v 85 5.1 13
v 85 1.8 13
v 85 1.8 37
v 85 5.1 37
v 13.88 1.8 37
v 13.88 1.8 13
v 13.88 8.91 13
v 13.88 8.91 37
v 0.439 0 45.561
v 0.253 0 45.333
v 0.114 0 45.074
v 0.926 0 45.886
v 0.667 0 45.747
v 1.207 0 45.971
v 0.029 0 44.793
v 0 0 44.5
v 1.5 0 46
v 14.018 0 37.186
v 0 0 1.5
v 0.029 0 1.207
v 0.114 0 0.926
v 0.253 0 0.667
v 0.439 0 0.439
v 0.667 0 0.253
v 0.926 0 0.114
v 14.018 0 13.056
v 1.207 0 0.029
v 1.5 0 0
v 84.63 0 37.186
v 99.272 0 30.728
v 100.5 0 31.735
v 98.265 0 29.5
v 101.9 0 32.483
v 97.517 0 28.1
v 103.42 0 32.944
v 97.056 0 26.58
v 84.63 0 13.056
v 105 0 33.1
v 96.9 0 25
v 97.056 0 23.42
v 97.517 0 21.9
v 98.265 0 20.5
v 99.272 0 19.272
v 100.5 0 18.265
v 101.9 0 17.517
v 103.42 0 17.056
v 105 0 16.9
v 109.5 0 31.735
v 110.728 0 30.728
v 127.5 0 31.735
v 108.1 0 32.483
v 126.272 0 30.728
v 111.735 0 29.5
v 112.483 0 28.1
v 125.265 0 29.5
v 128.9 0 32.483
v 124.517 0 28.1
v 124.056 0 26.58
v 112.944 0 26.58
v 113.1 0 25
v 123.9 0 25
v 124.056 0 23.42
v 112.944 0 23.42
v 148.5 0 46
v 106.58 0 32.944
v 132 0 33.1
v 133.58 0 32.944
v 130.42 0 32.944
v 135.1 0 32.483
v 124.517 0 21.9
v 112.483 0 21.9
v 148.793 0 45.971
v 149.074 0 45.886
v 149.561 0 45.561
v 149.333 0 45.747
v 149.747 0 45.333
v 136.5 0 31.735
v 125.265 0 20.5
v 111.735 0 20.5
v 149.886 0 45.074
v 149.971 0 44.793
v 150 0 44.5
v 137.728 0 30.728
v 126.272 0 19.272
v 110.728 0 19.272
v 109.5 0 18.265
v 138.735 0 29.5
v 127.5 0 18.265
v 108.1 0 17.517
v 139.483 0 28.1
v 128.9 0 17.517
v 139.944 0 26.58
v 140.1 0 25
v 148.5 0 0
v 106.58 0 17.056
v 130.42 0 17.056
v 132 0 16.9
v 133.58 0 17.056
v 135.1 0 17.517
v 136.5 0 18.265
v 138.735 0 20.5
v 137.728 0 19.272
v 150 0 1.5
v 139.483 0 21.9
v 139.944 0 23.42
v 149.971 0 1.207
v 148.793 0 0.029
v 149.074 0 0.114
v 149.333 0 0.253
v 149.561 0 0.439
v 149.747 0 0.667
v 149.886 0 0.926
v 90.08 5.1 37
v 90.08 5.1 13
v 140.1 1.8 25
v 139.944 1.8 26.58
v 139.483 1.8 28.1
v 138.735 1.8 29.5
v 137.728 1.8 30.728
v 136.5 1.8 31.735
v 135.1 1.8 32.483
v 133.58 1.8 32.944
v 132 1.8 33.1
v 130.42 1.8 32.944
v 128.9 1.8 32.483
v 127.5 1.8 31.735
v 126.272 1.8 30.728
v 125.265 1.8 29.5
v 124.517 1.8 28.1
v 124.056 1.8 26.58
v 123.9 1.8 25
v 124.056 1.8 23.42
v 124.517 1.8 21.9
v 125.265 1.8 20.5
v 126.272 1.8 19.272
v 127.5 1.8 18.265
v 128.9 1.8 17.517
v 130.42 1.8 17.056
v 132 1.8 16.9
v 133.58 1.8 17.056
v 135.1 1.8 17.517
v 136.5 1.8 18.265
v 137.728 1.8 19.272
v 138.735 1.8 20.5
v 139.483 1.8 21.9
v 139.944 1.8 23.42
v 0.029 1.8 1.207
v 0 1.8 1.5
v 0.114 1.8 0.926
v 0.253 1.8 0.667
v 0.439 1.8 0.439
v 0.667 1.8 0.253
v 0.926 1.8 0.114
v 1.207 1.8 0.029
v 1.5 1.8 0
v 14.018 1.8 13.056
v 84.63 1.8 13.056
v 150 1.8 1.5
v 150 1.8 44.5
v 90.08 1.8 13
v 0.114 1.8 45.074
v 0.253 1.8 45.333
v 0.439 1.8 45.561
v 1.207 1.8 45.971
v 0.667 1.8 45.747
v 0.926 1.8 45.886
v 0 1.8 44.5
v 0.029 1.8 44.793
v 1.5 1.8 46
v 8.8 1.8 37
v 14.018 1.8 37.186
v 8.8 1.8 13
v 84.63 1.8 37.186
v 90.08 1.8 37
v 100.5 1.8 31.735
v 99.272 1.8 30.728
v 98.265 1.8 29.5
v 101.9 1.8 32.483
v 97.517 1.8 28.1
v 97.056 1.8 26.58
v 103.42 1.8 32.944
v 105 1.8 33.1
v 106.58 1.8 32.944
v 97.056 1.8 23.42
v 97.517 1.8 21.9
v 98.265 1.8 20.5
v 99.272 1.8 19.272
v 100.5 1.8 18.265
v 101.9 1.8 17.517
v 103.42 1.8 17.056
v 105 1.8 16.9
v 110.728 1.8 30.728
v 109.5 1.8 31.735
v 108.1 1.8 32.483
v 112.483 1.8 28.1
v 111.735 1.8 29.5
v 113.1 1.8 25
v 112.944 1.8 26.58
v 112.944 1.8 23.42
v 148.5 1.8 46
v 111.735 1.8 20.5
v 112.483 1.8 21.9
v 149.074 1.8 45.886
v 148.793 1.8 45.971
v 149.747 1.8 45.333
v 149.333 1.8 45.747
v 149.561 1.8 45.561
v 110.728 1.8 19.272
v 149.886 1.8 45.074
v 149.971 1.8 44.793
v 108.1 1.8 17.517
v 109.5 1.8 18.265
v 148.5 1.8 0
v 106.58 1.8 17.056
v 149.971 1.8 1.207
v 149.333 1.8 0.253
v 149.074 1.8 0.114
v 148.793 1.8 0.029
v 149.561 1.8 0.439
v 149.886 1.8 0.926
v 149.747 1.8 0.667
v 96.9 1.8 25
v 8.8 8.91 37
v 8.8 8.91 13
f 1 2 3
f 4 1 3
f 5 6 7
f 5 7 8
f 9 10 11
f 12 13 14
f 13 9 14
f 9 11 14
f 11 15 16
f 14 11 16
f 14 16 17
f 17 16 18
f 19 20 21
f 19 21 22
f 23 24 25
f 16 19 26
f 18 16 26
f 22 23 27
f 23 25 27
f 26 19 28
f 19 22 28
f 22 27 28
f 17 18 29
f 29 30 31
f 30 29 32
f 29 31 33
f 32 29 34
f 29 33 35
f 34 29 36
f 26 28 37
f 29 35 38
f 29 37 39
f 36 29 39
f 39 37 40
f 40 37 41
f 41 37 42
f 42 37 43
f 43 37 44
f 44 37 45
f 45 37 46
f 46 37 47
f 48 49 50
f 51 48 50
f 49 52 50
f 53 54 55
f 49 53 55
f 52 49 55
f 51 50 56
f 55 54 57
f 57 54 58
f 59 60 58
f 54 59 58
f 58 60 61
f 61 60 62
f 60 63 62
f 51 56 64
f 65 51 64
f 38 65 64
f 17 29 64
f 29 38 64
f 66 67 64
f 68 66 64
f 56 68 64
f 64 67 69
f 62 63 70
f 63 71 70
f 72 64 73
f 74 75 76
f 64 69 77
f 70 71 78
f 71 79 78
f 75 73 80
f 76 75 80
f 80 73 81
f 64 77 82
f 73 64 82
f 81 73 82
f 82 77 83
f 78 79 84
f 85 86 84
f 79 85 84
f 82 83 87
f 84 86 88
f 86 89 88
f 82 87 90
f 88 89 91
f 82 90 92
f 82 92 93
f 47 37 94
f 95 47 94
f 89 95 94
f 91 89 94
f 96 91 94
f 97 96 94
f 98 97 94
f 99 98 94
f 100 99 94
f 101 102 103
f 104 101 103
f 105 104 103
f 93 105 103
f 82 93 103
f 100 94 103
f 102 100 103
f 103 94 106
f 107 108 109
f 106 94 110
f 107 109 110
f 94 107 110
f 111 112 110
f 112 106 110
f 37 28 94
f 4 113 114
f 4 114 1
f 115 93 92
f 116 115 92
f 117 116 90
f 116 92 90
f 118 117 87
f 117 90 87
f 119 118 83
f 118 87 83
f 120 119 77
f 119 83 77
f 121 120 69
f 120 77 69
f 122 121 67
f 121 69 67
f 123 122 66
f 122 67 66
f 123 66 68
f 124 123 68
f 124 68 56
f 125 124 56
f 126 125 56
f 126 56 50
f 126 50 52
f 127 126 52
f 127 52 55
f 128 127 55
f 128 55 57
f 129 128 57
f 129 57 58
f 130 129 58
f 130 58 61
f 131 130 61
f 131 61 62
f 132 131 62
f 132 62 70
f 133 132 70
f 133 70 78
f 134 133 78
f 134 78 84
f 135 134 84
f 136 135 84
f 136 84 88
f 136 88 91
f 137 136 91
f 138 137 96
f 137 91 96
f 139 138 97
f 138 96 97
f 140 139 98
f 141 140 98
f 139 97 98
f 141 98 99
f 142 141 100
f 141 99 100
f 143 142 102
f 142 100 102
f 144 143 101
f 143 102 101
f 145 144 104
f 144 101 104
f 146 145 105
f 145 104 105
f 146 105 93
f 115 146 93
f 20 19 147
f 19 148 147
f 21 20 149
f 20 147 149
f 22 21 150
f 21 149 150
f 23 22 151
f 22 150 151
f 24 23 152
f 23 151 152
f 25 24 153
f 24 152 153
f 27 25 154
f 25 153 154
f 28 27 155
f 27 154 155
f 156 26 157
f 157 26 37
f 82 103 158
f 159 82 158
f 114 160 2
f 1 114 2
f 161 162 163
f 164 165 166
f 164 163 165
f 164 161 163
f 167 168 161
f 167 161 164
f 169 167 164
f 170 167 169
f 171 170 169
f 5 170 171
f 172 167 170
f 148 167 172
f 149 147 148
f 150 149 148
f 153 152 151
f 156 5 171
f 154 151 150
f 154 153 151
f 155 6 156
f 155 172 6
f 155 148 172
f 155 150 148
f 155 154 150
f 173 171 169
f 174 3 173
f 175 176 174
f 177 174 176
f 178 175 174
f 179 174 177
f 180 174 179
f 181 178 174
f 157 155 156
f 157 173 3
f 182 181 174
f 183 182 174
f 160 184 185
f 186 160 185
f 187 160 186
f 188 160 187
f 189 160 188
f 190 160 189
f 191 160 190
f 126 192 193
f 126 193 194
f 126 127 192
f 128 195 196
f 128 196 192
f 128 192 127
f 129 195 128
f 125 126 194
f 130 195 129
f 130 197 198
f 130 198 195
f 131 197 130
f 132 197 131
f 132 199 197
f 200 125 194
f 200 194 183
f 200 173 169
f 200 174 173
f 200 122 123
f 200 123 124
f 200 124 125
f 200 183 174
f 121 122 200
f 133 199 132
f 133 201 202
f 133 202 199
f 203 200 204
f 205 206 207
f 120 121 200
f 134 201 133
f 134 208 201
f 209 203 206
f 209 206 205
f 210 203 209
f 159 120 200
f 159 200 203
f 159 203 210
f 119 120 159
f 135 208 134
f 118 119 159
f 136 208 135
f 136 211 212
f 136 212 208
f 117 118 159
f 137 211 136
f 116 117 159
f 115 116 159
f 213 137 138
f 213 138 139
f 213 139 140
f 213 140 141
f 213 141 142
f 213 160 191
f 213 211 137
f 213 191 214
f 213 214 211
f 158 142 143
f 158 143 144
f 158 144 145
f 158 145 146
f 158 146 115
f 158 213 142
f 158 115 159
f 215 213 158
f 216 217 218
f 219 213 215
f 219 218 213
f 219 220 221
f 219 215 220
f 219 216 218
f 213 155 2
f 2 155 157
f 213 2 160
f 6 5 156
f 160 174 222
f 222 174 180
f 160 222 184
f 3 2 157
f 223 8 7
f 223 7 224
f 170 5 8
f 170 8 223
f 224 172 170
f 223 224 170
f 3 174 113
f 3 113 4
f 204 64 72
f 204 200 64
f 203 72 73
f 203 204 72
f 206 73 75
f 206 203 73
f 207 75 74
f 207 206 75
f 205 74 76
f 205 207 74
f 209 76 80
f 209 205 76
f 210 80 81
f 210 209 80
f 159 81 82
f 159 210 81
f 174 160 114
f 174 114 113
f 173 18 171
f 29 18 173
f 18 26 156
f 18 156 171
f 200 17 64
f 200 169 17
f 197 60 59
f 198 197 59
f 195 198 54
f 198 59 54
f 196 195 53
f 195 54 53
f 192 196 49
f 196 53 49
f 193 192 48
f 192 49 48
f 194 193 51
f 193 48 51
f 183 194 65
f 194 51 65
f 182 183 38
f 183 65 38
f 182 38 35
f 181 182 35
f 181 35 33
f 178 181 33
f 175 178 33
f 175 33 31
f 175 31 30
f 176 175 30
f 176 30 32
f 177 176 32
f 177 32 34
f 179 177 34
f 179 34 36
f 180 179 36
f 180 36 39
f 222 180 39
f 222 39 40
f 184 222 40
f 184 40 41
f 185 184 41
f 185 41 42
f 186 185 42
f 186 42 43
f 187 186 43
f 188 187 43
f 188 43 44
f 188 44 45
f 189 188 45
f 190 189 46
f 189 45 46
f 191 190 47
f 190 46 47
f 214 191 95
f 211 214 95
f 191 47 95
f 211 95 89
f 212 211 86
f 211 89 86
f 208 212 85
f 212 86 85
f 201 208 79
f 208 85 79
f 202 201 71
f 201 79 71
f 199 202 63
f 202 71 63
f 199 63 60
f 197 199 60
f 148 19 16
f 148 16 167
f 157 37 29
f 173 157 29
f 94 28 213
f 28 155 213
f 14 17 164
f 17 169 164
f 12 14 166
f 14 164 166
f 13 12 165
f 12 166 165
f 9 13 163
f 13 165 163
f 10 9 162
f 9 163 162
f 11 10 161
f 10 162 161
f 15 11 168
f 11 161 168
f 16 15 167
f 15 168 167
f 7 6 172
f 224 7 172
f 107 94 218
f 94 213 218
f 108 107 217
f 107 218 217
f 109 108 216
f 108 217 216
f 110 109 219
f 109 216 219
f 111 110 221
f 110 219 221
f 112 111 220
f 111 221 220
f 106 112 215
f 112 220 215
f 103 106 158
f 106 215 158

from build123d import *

# Parameters (mm, degrees)
SKETCH002_AS_DRAWN_W                      = 5.08
SKETCH002_AS_DRAWN_H                      = 24
EXTRUDE_DEPTH                             = 7.11
EXTRUDE_ONTO_SKETCH002_ROLL_ANGLE         = 90
EXTRUDE_ONTO_SKETCH002_PLACEMENT_ANGLE    = 180
SKETCH003_AS_DRAWN_W                      = 5.08
SKETCH003_AS_DRAWN_H                      = 24
EXTRUDE004_DEPTH                          = 3.3
EXTRUDE004_ONTO_SKETCH003_ROLL_ANGLE      = 90
EXTRUDE004_ONTO_SKETCH003_PLACEMENT_ANGLE = 180
BOX_W                                     = 150
BOX_H                                     = 1.8
BOX_DEPTH                                 = 46
SKETCH_W                                  = 70.612
SKETCH_H                                  = 24.13
POCKET_DEPTH                              = 1.801
SKETCH001_R                               = 8.1
POCKET001_DEPTH                           = 1.801
FILLET_R                                  = 1.5
FILLET001_R                               = 1.5
FILLET002_R                               = 1.5
FILLET003_R                               = 1.5


with BuildPart() as extrude_body:
    # Sketch002 as drawn → Extrude (new)
    with BuildSketch(Plane.XY):
        with Locations((-11.34, 25)):
            Rectangle(SKETCH002_AS_DRAWN_W, SKETCH002_AS_DRAWN_H)
    extrude(amount=EXTRUDE_DEPTH)


with BuildPart() as extrude_body_1:
    # Extrude onto Sketch002 roll: moved
    add(extrude_body.part.rotate(Axis((0, 0, 0), (1, 0, 0)), EXTRUDE_ONTO_SKETCH002_ROLL_ANGLE))


with BuildPart() as extrude_body_2:
    # Extrude onto Sketch002 placement: moved
    add(extrude_body_1.part.moved(Location((0, 1.8, 0))).rotate(Axis((0, 1.8, 0), (0, 0, 1)), EXTRUDE_ONTO_SKETCH002_PLACEMENT_ANGLE))


with BuildPart() as extrude004:
    # Sketch003 as drawn → Extrude004 (new)
    with BuildSketch(Plane.XY):
        with Locations((-87.54, 25)):
            Rectangle(SKETCH003_AS_DRAWN_W, SKETCH003_AS_DRAWN_H)
    extrude(amount=EXTRUDE004_DEPTH)


with BuildPart() as extrude004_1:
    # Extrude004 onto Sketch003 roll: moved
    add(extrude004.part.rotate(Axis((0, 0, 0), (1, 0, 0)), EXTRUDE004_ONTO_SKETCH003_ROLL_ANGLE))


with BuildPart() as extrude004_2:
    # Extrude004 onto Sketch003 placement: moved
    add(extrude004_1.part.moved(Location((0, 1.8, 0))).rotate(Axis((0, 1.8, 0), (0, 0, 1)), EXTRUDE004_ONTO_SKETCH003_PLACEMENT_ANGLE))


with BuildPart() as fusion:
    # Box → Box (new body)
    with BuildSketch(Plane.XY):
        with Locations((75, 0.9)):
            Rectangle(BOX_W, BOX_H)
    extrude(amount=BOX_DEPTH)

    # Sketch → Pocket (cut, through all)
    with BuildSketch(Plane.XZ):
        with Locations((49.323872, 25.120575)):
            Rectangle(SKETCH_W, SKETCH_H)
    extrude(amount=-POCKET_DEPTH, mode=Mode.SUBTRACT)

    # Sketch001 → Pocket001 (cut, through all)
    with BuildSketch(Plane.XZ):
        with Locations((105, 25)):
            Circle(SKETCH001_R)
        with Locations((132, 25)):
            Circle(SKETCH001_R)
    extrude(amount=-POCKET001_DEPTH, mode=Mode.SUBTRACT)

    # Fillet
    fillet_edges = [fusion.edges().sort_by_distance(p)[0] for p in [
        (150, 0.9, 46),
    ]]
    fillet(fillet_edges, radius=FILLET_R)

    # Fillet001
    fillet001_edges = [fusion.edges().sort_by_distance(p)[0] for p in [
        (0, 0.9, 46),
    ]]
    fillet(fillet001_edges, radius=FILLET001_R)

    # Fillet002
    fillet002_edges = [fusion.edges().sort_by_distance(p)[0] for p in [
        (0, 0.9, 0),
    ]]
    fillet(fillet002_edges, radius=FILLET002_R)

    # Fillet003
    fillet003_edges = [fusion.edges().sort_by_distance(p)[0] for p in [
        (150, 0.9, 0),
    ]]
    fillet(fillet003_edges, radius=FILLET003_R)

    # Fusion: union Extrude body, Extrude004
    add(extrude_body_2.part)
    add(extrude004_2.part)


solid = fusion.part
